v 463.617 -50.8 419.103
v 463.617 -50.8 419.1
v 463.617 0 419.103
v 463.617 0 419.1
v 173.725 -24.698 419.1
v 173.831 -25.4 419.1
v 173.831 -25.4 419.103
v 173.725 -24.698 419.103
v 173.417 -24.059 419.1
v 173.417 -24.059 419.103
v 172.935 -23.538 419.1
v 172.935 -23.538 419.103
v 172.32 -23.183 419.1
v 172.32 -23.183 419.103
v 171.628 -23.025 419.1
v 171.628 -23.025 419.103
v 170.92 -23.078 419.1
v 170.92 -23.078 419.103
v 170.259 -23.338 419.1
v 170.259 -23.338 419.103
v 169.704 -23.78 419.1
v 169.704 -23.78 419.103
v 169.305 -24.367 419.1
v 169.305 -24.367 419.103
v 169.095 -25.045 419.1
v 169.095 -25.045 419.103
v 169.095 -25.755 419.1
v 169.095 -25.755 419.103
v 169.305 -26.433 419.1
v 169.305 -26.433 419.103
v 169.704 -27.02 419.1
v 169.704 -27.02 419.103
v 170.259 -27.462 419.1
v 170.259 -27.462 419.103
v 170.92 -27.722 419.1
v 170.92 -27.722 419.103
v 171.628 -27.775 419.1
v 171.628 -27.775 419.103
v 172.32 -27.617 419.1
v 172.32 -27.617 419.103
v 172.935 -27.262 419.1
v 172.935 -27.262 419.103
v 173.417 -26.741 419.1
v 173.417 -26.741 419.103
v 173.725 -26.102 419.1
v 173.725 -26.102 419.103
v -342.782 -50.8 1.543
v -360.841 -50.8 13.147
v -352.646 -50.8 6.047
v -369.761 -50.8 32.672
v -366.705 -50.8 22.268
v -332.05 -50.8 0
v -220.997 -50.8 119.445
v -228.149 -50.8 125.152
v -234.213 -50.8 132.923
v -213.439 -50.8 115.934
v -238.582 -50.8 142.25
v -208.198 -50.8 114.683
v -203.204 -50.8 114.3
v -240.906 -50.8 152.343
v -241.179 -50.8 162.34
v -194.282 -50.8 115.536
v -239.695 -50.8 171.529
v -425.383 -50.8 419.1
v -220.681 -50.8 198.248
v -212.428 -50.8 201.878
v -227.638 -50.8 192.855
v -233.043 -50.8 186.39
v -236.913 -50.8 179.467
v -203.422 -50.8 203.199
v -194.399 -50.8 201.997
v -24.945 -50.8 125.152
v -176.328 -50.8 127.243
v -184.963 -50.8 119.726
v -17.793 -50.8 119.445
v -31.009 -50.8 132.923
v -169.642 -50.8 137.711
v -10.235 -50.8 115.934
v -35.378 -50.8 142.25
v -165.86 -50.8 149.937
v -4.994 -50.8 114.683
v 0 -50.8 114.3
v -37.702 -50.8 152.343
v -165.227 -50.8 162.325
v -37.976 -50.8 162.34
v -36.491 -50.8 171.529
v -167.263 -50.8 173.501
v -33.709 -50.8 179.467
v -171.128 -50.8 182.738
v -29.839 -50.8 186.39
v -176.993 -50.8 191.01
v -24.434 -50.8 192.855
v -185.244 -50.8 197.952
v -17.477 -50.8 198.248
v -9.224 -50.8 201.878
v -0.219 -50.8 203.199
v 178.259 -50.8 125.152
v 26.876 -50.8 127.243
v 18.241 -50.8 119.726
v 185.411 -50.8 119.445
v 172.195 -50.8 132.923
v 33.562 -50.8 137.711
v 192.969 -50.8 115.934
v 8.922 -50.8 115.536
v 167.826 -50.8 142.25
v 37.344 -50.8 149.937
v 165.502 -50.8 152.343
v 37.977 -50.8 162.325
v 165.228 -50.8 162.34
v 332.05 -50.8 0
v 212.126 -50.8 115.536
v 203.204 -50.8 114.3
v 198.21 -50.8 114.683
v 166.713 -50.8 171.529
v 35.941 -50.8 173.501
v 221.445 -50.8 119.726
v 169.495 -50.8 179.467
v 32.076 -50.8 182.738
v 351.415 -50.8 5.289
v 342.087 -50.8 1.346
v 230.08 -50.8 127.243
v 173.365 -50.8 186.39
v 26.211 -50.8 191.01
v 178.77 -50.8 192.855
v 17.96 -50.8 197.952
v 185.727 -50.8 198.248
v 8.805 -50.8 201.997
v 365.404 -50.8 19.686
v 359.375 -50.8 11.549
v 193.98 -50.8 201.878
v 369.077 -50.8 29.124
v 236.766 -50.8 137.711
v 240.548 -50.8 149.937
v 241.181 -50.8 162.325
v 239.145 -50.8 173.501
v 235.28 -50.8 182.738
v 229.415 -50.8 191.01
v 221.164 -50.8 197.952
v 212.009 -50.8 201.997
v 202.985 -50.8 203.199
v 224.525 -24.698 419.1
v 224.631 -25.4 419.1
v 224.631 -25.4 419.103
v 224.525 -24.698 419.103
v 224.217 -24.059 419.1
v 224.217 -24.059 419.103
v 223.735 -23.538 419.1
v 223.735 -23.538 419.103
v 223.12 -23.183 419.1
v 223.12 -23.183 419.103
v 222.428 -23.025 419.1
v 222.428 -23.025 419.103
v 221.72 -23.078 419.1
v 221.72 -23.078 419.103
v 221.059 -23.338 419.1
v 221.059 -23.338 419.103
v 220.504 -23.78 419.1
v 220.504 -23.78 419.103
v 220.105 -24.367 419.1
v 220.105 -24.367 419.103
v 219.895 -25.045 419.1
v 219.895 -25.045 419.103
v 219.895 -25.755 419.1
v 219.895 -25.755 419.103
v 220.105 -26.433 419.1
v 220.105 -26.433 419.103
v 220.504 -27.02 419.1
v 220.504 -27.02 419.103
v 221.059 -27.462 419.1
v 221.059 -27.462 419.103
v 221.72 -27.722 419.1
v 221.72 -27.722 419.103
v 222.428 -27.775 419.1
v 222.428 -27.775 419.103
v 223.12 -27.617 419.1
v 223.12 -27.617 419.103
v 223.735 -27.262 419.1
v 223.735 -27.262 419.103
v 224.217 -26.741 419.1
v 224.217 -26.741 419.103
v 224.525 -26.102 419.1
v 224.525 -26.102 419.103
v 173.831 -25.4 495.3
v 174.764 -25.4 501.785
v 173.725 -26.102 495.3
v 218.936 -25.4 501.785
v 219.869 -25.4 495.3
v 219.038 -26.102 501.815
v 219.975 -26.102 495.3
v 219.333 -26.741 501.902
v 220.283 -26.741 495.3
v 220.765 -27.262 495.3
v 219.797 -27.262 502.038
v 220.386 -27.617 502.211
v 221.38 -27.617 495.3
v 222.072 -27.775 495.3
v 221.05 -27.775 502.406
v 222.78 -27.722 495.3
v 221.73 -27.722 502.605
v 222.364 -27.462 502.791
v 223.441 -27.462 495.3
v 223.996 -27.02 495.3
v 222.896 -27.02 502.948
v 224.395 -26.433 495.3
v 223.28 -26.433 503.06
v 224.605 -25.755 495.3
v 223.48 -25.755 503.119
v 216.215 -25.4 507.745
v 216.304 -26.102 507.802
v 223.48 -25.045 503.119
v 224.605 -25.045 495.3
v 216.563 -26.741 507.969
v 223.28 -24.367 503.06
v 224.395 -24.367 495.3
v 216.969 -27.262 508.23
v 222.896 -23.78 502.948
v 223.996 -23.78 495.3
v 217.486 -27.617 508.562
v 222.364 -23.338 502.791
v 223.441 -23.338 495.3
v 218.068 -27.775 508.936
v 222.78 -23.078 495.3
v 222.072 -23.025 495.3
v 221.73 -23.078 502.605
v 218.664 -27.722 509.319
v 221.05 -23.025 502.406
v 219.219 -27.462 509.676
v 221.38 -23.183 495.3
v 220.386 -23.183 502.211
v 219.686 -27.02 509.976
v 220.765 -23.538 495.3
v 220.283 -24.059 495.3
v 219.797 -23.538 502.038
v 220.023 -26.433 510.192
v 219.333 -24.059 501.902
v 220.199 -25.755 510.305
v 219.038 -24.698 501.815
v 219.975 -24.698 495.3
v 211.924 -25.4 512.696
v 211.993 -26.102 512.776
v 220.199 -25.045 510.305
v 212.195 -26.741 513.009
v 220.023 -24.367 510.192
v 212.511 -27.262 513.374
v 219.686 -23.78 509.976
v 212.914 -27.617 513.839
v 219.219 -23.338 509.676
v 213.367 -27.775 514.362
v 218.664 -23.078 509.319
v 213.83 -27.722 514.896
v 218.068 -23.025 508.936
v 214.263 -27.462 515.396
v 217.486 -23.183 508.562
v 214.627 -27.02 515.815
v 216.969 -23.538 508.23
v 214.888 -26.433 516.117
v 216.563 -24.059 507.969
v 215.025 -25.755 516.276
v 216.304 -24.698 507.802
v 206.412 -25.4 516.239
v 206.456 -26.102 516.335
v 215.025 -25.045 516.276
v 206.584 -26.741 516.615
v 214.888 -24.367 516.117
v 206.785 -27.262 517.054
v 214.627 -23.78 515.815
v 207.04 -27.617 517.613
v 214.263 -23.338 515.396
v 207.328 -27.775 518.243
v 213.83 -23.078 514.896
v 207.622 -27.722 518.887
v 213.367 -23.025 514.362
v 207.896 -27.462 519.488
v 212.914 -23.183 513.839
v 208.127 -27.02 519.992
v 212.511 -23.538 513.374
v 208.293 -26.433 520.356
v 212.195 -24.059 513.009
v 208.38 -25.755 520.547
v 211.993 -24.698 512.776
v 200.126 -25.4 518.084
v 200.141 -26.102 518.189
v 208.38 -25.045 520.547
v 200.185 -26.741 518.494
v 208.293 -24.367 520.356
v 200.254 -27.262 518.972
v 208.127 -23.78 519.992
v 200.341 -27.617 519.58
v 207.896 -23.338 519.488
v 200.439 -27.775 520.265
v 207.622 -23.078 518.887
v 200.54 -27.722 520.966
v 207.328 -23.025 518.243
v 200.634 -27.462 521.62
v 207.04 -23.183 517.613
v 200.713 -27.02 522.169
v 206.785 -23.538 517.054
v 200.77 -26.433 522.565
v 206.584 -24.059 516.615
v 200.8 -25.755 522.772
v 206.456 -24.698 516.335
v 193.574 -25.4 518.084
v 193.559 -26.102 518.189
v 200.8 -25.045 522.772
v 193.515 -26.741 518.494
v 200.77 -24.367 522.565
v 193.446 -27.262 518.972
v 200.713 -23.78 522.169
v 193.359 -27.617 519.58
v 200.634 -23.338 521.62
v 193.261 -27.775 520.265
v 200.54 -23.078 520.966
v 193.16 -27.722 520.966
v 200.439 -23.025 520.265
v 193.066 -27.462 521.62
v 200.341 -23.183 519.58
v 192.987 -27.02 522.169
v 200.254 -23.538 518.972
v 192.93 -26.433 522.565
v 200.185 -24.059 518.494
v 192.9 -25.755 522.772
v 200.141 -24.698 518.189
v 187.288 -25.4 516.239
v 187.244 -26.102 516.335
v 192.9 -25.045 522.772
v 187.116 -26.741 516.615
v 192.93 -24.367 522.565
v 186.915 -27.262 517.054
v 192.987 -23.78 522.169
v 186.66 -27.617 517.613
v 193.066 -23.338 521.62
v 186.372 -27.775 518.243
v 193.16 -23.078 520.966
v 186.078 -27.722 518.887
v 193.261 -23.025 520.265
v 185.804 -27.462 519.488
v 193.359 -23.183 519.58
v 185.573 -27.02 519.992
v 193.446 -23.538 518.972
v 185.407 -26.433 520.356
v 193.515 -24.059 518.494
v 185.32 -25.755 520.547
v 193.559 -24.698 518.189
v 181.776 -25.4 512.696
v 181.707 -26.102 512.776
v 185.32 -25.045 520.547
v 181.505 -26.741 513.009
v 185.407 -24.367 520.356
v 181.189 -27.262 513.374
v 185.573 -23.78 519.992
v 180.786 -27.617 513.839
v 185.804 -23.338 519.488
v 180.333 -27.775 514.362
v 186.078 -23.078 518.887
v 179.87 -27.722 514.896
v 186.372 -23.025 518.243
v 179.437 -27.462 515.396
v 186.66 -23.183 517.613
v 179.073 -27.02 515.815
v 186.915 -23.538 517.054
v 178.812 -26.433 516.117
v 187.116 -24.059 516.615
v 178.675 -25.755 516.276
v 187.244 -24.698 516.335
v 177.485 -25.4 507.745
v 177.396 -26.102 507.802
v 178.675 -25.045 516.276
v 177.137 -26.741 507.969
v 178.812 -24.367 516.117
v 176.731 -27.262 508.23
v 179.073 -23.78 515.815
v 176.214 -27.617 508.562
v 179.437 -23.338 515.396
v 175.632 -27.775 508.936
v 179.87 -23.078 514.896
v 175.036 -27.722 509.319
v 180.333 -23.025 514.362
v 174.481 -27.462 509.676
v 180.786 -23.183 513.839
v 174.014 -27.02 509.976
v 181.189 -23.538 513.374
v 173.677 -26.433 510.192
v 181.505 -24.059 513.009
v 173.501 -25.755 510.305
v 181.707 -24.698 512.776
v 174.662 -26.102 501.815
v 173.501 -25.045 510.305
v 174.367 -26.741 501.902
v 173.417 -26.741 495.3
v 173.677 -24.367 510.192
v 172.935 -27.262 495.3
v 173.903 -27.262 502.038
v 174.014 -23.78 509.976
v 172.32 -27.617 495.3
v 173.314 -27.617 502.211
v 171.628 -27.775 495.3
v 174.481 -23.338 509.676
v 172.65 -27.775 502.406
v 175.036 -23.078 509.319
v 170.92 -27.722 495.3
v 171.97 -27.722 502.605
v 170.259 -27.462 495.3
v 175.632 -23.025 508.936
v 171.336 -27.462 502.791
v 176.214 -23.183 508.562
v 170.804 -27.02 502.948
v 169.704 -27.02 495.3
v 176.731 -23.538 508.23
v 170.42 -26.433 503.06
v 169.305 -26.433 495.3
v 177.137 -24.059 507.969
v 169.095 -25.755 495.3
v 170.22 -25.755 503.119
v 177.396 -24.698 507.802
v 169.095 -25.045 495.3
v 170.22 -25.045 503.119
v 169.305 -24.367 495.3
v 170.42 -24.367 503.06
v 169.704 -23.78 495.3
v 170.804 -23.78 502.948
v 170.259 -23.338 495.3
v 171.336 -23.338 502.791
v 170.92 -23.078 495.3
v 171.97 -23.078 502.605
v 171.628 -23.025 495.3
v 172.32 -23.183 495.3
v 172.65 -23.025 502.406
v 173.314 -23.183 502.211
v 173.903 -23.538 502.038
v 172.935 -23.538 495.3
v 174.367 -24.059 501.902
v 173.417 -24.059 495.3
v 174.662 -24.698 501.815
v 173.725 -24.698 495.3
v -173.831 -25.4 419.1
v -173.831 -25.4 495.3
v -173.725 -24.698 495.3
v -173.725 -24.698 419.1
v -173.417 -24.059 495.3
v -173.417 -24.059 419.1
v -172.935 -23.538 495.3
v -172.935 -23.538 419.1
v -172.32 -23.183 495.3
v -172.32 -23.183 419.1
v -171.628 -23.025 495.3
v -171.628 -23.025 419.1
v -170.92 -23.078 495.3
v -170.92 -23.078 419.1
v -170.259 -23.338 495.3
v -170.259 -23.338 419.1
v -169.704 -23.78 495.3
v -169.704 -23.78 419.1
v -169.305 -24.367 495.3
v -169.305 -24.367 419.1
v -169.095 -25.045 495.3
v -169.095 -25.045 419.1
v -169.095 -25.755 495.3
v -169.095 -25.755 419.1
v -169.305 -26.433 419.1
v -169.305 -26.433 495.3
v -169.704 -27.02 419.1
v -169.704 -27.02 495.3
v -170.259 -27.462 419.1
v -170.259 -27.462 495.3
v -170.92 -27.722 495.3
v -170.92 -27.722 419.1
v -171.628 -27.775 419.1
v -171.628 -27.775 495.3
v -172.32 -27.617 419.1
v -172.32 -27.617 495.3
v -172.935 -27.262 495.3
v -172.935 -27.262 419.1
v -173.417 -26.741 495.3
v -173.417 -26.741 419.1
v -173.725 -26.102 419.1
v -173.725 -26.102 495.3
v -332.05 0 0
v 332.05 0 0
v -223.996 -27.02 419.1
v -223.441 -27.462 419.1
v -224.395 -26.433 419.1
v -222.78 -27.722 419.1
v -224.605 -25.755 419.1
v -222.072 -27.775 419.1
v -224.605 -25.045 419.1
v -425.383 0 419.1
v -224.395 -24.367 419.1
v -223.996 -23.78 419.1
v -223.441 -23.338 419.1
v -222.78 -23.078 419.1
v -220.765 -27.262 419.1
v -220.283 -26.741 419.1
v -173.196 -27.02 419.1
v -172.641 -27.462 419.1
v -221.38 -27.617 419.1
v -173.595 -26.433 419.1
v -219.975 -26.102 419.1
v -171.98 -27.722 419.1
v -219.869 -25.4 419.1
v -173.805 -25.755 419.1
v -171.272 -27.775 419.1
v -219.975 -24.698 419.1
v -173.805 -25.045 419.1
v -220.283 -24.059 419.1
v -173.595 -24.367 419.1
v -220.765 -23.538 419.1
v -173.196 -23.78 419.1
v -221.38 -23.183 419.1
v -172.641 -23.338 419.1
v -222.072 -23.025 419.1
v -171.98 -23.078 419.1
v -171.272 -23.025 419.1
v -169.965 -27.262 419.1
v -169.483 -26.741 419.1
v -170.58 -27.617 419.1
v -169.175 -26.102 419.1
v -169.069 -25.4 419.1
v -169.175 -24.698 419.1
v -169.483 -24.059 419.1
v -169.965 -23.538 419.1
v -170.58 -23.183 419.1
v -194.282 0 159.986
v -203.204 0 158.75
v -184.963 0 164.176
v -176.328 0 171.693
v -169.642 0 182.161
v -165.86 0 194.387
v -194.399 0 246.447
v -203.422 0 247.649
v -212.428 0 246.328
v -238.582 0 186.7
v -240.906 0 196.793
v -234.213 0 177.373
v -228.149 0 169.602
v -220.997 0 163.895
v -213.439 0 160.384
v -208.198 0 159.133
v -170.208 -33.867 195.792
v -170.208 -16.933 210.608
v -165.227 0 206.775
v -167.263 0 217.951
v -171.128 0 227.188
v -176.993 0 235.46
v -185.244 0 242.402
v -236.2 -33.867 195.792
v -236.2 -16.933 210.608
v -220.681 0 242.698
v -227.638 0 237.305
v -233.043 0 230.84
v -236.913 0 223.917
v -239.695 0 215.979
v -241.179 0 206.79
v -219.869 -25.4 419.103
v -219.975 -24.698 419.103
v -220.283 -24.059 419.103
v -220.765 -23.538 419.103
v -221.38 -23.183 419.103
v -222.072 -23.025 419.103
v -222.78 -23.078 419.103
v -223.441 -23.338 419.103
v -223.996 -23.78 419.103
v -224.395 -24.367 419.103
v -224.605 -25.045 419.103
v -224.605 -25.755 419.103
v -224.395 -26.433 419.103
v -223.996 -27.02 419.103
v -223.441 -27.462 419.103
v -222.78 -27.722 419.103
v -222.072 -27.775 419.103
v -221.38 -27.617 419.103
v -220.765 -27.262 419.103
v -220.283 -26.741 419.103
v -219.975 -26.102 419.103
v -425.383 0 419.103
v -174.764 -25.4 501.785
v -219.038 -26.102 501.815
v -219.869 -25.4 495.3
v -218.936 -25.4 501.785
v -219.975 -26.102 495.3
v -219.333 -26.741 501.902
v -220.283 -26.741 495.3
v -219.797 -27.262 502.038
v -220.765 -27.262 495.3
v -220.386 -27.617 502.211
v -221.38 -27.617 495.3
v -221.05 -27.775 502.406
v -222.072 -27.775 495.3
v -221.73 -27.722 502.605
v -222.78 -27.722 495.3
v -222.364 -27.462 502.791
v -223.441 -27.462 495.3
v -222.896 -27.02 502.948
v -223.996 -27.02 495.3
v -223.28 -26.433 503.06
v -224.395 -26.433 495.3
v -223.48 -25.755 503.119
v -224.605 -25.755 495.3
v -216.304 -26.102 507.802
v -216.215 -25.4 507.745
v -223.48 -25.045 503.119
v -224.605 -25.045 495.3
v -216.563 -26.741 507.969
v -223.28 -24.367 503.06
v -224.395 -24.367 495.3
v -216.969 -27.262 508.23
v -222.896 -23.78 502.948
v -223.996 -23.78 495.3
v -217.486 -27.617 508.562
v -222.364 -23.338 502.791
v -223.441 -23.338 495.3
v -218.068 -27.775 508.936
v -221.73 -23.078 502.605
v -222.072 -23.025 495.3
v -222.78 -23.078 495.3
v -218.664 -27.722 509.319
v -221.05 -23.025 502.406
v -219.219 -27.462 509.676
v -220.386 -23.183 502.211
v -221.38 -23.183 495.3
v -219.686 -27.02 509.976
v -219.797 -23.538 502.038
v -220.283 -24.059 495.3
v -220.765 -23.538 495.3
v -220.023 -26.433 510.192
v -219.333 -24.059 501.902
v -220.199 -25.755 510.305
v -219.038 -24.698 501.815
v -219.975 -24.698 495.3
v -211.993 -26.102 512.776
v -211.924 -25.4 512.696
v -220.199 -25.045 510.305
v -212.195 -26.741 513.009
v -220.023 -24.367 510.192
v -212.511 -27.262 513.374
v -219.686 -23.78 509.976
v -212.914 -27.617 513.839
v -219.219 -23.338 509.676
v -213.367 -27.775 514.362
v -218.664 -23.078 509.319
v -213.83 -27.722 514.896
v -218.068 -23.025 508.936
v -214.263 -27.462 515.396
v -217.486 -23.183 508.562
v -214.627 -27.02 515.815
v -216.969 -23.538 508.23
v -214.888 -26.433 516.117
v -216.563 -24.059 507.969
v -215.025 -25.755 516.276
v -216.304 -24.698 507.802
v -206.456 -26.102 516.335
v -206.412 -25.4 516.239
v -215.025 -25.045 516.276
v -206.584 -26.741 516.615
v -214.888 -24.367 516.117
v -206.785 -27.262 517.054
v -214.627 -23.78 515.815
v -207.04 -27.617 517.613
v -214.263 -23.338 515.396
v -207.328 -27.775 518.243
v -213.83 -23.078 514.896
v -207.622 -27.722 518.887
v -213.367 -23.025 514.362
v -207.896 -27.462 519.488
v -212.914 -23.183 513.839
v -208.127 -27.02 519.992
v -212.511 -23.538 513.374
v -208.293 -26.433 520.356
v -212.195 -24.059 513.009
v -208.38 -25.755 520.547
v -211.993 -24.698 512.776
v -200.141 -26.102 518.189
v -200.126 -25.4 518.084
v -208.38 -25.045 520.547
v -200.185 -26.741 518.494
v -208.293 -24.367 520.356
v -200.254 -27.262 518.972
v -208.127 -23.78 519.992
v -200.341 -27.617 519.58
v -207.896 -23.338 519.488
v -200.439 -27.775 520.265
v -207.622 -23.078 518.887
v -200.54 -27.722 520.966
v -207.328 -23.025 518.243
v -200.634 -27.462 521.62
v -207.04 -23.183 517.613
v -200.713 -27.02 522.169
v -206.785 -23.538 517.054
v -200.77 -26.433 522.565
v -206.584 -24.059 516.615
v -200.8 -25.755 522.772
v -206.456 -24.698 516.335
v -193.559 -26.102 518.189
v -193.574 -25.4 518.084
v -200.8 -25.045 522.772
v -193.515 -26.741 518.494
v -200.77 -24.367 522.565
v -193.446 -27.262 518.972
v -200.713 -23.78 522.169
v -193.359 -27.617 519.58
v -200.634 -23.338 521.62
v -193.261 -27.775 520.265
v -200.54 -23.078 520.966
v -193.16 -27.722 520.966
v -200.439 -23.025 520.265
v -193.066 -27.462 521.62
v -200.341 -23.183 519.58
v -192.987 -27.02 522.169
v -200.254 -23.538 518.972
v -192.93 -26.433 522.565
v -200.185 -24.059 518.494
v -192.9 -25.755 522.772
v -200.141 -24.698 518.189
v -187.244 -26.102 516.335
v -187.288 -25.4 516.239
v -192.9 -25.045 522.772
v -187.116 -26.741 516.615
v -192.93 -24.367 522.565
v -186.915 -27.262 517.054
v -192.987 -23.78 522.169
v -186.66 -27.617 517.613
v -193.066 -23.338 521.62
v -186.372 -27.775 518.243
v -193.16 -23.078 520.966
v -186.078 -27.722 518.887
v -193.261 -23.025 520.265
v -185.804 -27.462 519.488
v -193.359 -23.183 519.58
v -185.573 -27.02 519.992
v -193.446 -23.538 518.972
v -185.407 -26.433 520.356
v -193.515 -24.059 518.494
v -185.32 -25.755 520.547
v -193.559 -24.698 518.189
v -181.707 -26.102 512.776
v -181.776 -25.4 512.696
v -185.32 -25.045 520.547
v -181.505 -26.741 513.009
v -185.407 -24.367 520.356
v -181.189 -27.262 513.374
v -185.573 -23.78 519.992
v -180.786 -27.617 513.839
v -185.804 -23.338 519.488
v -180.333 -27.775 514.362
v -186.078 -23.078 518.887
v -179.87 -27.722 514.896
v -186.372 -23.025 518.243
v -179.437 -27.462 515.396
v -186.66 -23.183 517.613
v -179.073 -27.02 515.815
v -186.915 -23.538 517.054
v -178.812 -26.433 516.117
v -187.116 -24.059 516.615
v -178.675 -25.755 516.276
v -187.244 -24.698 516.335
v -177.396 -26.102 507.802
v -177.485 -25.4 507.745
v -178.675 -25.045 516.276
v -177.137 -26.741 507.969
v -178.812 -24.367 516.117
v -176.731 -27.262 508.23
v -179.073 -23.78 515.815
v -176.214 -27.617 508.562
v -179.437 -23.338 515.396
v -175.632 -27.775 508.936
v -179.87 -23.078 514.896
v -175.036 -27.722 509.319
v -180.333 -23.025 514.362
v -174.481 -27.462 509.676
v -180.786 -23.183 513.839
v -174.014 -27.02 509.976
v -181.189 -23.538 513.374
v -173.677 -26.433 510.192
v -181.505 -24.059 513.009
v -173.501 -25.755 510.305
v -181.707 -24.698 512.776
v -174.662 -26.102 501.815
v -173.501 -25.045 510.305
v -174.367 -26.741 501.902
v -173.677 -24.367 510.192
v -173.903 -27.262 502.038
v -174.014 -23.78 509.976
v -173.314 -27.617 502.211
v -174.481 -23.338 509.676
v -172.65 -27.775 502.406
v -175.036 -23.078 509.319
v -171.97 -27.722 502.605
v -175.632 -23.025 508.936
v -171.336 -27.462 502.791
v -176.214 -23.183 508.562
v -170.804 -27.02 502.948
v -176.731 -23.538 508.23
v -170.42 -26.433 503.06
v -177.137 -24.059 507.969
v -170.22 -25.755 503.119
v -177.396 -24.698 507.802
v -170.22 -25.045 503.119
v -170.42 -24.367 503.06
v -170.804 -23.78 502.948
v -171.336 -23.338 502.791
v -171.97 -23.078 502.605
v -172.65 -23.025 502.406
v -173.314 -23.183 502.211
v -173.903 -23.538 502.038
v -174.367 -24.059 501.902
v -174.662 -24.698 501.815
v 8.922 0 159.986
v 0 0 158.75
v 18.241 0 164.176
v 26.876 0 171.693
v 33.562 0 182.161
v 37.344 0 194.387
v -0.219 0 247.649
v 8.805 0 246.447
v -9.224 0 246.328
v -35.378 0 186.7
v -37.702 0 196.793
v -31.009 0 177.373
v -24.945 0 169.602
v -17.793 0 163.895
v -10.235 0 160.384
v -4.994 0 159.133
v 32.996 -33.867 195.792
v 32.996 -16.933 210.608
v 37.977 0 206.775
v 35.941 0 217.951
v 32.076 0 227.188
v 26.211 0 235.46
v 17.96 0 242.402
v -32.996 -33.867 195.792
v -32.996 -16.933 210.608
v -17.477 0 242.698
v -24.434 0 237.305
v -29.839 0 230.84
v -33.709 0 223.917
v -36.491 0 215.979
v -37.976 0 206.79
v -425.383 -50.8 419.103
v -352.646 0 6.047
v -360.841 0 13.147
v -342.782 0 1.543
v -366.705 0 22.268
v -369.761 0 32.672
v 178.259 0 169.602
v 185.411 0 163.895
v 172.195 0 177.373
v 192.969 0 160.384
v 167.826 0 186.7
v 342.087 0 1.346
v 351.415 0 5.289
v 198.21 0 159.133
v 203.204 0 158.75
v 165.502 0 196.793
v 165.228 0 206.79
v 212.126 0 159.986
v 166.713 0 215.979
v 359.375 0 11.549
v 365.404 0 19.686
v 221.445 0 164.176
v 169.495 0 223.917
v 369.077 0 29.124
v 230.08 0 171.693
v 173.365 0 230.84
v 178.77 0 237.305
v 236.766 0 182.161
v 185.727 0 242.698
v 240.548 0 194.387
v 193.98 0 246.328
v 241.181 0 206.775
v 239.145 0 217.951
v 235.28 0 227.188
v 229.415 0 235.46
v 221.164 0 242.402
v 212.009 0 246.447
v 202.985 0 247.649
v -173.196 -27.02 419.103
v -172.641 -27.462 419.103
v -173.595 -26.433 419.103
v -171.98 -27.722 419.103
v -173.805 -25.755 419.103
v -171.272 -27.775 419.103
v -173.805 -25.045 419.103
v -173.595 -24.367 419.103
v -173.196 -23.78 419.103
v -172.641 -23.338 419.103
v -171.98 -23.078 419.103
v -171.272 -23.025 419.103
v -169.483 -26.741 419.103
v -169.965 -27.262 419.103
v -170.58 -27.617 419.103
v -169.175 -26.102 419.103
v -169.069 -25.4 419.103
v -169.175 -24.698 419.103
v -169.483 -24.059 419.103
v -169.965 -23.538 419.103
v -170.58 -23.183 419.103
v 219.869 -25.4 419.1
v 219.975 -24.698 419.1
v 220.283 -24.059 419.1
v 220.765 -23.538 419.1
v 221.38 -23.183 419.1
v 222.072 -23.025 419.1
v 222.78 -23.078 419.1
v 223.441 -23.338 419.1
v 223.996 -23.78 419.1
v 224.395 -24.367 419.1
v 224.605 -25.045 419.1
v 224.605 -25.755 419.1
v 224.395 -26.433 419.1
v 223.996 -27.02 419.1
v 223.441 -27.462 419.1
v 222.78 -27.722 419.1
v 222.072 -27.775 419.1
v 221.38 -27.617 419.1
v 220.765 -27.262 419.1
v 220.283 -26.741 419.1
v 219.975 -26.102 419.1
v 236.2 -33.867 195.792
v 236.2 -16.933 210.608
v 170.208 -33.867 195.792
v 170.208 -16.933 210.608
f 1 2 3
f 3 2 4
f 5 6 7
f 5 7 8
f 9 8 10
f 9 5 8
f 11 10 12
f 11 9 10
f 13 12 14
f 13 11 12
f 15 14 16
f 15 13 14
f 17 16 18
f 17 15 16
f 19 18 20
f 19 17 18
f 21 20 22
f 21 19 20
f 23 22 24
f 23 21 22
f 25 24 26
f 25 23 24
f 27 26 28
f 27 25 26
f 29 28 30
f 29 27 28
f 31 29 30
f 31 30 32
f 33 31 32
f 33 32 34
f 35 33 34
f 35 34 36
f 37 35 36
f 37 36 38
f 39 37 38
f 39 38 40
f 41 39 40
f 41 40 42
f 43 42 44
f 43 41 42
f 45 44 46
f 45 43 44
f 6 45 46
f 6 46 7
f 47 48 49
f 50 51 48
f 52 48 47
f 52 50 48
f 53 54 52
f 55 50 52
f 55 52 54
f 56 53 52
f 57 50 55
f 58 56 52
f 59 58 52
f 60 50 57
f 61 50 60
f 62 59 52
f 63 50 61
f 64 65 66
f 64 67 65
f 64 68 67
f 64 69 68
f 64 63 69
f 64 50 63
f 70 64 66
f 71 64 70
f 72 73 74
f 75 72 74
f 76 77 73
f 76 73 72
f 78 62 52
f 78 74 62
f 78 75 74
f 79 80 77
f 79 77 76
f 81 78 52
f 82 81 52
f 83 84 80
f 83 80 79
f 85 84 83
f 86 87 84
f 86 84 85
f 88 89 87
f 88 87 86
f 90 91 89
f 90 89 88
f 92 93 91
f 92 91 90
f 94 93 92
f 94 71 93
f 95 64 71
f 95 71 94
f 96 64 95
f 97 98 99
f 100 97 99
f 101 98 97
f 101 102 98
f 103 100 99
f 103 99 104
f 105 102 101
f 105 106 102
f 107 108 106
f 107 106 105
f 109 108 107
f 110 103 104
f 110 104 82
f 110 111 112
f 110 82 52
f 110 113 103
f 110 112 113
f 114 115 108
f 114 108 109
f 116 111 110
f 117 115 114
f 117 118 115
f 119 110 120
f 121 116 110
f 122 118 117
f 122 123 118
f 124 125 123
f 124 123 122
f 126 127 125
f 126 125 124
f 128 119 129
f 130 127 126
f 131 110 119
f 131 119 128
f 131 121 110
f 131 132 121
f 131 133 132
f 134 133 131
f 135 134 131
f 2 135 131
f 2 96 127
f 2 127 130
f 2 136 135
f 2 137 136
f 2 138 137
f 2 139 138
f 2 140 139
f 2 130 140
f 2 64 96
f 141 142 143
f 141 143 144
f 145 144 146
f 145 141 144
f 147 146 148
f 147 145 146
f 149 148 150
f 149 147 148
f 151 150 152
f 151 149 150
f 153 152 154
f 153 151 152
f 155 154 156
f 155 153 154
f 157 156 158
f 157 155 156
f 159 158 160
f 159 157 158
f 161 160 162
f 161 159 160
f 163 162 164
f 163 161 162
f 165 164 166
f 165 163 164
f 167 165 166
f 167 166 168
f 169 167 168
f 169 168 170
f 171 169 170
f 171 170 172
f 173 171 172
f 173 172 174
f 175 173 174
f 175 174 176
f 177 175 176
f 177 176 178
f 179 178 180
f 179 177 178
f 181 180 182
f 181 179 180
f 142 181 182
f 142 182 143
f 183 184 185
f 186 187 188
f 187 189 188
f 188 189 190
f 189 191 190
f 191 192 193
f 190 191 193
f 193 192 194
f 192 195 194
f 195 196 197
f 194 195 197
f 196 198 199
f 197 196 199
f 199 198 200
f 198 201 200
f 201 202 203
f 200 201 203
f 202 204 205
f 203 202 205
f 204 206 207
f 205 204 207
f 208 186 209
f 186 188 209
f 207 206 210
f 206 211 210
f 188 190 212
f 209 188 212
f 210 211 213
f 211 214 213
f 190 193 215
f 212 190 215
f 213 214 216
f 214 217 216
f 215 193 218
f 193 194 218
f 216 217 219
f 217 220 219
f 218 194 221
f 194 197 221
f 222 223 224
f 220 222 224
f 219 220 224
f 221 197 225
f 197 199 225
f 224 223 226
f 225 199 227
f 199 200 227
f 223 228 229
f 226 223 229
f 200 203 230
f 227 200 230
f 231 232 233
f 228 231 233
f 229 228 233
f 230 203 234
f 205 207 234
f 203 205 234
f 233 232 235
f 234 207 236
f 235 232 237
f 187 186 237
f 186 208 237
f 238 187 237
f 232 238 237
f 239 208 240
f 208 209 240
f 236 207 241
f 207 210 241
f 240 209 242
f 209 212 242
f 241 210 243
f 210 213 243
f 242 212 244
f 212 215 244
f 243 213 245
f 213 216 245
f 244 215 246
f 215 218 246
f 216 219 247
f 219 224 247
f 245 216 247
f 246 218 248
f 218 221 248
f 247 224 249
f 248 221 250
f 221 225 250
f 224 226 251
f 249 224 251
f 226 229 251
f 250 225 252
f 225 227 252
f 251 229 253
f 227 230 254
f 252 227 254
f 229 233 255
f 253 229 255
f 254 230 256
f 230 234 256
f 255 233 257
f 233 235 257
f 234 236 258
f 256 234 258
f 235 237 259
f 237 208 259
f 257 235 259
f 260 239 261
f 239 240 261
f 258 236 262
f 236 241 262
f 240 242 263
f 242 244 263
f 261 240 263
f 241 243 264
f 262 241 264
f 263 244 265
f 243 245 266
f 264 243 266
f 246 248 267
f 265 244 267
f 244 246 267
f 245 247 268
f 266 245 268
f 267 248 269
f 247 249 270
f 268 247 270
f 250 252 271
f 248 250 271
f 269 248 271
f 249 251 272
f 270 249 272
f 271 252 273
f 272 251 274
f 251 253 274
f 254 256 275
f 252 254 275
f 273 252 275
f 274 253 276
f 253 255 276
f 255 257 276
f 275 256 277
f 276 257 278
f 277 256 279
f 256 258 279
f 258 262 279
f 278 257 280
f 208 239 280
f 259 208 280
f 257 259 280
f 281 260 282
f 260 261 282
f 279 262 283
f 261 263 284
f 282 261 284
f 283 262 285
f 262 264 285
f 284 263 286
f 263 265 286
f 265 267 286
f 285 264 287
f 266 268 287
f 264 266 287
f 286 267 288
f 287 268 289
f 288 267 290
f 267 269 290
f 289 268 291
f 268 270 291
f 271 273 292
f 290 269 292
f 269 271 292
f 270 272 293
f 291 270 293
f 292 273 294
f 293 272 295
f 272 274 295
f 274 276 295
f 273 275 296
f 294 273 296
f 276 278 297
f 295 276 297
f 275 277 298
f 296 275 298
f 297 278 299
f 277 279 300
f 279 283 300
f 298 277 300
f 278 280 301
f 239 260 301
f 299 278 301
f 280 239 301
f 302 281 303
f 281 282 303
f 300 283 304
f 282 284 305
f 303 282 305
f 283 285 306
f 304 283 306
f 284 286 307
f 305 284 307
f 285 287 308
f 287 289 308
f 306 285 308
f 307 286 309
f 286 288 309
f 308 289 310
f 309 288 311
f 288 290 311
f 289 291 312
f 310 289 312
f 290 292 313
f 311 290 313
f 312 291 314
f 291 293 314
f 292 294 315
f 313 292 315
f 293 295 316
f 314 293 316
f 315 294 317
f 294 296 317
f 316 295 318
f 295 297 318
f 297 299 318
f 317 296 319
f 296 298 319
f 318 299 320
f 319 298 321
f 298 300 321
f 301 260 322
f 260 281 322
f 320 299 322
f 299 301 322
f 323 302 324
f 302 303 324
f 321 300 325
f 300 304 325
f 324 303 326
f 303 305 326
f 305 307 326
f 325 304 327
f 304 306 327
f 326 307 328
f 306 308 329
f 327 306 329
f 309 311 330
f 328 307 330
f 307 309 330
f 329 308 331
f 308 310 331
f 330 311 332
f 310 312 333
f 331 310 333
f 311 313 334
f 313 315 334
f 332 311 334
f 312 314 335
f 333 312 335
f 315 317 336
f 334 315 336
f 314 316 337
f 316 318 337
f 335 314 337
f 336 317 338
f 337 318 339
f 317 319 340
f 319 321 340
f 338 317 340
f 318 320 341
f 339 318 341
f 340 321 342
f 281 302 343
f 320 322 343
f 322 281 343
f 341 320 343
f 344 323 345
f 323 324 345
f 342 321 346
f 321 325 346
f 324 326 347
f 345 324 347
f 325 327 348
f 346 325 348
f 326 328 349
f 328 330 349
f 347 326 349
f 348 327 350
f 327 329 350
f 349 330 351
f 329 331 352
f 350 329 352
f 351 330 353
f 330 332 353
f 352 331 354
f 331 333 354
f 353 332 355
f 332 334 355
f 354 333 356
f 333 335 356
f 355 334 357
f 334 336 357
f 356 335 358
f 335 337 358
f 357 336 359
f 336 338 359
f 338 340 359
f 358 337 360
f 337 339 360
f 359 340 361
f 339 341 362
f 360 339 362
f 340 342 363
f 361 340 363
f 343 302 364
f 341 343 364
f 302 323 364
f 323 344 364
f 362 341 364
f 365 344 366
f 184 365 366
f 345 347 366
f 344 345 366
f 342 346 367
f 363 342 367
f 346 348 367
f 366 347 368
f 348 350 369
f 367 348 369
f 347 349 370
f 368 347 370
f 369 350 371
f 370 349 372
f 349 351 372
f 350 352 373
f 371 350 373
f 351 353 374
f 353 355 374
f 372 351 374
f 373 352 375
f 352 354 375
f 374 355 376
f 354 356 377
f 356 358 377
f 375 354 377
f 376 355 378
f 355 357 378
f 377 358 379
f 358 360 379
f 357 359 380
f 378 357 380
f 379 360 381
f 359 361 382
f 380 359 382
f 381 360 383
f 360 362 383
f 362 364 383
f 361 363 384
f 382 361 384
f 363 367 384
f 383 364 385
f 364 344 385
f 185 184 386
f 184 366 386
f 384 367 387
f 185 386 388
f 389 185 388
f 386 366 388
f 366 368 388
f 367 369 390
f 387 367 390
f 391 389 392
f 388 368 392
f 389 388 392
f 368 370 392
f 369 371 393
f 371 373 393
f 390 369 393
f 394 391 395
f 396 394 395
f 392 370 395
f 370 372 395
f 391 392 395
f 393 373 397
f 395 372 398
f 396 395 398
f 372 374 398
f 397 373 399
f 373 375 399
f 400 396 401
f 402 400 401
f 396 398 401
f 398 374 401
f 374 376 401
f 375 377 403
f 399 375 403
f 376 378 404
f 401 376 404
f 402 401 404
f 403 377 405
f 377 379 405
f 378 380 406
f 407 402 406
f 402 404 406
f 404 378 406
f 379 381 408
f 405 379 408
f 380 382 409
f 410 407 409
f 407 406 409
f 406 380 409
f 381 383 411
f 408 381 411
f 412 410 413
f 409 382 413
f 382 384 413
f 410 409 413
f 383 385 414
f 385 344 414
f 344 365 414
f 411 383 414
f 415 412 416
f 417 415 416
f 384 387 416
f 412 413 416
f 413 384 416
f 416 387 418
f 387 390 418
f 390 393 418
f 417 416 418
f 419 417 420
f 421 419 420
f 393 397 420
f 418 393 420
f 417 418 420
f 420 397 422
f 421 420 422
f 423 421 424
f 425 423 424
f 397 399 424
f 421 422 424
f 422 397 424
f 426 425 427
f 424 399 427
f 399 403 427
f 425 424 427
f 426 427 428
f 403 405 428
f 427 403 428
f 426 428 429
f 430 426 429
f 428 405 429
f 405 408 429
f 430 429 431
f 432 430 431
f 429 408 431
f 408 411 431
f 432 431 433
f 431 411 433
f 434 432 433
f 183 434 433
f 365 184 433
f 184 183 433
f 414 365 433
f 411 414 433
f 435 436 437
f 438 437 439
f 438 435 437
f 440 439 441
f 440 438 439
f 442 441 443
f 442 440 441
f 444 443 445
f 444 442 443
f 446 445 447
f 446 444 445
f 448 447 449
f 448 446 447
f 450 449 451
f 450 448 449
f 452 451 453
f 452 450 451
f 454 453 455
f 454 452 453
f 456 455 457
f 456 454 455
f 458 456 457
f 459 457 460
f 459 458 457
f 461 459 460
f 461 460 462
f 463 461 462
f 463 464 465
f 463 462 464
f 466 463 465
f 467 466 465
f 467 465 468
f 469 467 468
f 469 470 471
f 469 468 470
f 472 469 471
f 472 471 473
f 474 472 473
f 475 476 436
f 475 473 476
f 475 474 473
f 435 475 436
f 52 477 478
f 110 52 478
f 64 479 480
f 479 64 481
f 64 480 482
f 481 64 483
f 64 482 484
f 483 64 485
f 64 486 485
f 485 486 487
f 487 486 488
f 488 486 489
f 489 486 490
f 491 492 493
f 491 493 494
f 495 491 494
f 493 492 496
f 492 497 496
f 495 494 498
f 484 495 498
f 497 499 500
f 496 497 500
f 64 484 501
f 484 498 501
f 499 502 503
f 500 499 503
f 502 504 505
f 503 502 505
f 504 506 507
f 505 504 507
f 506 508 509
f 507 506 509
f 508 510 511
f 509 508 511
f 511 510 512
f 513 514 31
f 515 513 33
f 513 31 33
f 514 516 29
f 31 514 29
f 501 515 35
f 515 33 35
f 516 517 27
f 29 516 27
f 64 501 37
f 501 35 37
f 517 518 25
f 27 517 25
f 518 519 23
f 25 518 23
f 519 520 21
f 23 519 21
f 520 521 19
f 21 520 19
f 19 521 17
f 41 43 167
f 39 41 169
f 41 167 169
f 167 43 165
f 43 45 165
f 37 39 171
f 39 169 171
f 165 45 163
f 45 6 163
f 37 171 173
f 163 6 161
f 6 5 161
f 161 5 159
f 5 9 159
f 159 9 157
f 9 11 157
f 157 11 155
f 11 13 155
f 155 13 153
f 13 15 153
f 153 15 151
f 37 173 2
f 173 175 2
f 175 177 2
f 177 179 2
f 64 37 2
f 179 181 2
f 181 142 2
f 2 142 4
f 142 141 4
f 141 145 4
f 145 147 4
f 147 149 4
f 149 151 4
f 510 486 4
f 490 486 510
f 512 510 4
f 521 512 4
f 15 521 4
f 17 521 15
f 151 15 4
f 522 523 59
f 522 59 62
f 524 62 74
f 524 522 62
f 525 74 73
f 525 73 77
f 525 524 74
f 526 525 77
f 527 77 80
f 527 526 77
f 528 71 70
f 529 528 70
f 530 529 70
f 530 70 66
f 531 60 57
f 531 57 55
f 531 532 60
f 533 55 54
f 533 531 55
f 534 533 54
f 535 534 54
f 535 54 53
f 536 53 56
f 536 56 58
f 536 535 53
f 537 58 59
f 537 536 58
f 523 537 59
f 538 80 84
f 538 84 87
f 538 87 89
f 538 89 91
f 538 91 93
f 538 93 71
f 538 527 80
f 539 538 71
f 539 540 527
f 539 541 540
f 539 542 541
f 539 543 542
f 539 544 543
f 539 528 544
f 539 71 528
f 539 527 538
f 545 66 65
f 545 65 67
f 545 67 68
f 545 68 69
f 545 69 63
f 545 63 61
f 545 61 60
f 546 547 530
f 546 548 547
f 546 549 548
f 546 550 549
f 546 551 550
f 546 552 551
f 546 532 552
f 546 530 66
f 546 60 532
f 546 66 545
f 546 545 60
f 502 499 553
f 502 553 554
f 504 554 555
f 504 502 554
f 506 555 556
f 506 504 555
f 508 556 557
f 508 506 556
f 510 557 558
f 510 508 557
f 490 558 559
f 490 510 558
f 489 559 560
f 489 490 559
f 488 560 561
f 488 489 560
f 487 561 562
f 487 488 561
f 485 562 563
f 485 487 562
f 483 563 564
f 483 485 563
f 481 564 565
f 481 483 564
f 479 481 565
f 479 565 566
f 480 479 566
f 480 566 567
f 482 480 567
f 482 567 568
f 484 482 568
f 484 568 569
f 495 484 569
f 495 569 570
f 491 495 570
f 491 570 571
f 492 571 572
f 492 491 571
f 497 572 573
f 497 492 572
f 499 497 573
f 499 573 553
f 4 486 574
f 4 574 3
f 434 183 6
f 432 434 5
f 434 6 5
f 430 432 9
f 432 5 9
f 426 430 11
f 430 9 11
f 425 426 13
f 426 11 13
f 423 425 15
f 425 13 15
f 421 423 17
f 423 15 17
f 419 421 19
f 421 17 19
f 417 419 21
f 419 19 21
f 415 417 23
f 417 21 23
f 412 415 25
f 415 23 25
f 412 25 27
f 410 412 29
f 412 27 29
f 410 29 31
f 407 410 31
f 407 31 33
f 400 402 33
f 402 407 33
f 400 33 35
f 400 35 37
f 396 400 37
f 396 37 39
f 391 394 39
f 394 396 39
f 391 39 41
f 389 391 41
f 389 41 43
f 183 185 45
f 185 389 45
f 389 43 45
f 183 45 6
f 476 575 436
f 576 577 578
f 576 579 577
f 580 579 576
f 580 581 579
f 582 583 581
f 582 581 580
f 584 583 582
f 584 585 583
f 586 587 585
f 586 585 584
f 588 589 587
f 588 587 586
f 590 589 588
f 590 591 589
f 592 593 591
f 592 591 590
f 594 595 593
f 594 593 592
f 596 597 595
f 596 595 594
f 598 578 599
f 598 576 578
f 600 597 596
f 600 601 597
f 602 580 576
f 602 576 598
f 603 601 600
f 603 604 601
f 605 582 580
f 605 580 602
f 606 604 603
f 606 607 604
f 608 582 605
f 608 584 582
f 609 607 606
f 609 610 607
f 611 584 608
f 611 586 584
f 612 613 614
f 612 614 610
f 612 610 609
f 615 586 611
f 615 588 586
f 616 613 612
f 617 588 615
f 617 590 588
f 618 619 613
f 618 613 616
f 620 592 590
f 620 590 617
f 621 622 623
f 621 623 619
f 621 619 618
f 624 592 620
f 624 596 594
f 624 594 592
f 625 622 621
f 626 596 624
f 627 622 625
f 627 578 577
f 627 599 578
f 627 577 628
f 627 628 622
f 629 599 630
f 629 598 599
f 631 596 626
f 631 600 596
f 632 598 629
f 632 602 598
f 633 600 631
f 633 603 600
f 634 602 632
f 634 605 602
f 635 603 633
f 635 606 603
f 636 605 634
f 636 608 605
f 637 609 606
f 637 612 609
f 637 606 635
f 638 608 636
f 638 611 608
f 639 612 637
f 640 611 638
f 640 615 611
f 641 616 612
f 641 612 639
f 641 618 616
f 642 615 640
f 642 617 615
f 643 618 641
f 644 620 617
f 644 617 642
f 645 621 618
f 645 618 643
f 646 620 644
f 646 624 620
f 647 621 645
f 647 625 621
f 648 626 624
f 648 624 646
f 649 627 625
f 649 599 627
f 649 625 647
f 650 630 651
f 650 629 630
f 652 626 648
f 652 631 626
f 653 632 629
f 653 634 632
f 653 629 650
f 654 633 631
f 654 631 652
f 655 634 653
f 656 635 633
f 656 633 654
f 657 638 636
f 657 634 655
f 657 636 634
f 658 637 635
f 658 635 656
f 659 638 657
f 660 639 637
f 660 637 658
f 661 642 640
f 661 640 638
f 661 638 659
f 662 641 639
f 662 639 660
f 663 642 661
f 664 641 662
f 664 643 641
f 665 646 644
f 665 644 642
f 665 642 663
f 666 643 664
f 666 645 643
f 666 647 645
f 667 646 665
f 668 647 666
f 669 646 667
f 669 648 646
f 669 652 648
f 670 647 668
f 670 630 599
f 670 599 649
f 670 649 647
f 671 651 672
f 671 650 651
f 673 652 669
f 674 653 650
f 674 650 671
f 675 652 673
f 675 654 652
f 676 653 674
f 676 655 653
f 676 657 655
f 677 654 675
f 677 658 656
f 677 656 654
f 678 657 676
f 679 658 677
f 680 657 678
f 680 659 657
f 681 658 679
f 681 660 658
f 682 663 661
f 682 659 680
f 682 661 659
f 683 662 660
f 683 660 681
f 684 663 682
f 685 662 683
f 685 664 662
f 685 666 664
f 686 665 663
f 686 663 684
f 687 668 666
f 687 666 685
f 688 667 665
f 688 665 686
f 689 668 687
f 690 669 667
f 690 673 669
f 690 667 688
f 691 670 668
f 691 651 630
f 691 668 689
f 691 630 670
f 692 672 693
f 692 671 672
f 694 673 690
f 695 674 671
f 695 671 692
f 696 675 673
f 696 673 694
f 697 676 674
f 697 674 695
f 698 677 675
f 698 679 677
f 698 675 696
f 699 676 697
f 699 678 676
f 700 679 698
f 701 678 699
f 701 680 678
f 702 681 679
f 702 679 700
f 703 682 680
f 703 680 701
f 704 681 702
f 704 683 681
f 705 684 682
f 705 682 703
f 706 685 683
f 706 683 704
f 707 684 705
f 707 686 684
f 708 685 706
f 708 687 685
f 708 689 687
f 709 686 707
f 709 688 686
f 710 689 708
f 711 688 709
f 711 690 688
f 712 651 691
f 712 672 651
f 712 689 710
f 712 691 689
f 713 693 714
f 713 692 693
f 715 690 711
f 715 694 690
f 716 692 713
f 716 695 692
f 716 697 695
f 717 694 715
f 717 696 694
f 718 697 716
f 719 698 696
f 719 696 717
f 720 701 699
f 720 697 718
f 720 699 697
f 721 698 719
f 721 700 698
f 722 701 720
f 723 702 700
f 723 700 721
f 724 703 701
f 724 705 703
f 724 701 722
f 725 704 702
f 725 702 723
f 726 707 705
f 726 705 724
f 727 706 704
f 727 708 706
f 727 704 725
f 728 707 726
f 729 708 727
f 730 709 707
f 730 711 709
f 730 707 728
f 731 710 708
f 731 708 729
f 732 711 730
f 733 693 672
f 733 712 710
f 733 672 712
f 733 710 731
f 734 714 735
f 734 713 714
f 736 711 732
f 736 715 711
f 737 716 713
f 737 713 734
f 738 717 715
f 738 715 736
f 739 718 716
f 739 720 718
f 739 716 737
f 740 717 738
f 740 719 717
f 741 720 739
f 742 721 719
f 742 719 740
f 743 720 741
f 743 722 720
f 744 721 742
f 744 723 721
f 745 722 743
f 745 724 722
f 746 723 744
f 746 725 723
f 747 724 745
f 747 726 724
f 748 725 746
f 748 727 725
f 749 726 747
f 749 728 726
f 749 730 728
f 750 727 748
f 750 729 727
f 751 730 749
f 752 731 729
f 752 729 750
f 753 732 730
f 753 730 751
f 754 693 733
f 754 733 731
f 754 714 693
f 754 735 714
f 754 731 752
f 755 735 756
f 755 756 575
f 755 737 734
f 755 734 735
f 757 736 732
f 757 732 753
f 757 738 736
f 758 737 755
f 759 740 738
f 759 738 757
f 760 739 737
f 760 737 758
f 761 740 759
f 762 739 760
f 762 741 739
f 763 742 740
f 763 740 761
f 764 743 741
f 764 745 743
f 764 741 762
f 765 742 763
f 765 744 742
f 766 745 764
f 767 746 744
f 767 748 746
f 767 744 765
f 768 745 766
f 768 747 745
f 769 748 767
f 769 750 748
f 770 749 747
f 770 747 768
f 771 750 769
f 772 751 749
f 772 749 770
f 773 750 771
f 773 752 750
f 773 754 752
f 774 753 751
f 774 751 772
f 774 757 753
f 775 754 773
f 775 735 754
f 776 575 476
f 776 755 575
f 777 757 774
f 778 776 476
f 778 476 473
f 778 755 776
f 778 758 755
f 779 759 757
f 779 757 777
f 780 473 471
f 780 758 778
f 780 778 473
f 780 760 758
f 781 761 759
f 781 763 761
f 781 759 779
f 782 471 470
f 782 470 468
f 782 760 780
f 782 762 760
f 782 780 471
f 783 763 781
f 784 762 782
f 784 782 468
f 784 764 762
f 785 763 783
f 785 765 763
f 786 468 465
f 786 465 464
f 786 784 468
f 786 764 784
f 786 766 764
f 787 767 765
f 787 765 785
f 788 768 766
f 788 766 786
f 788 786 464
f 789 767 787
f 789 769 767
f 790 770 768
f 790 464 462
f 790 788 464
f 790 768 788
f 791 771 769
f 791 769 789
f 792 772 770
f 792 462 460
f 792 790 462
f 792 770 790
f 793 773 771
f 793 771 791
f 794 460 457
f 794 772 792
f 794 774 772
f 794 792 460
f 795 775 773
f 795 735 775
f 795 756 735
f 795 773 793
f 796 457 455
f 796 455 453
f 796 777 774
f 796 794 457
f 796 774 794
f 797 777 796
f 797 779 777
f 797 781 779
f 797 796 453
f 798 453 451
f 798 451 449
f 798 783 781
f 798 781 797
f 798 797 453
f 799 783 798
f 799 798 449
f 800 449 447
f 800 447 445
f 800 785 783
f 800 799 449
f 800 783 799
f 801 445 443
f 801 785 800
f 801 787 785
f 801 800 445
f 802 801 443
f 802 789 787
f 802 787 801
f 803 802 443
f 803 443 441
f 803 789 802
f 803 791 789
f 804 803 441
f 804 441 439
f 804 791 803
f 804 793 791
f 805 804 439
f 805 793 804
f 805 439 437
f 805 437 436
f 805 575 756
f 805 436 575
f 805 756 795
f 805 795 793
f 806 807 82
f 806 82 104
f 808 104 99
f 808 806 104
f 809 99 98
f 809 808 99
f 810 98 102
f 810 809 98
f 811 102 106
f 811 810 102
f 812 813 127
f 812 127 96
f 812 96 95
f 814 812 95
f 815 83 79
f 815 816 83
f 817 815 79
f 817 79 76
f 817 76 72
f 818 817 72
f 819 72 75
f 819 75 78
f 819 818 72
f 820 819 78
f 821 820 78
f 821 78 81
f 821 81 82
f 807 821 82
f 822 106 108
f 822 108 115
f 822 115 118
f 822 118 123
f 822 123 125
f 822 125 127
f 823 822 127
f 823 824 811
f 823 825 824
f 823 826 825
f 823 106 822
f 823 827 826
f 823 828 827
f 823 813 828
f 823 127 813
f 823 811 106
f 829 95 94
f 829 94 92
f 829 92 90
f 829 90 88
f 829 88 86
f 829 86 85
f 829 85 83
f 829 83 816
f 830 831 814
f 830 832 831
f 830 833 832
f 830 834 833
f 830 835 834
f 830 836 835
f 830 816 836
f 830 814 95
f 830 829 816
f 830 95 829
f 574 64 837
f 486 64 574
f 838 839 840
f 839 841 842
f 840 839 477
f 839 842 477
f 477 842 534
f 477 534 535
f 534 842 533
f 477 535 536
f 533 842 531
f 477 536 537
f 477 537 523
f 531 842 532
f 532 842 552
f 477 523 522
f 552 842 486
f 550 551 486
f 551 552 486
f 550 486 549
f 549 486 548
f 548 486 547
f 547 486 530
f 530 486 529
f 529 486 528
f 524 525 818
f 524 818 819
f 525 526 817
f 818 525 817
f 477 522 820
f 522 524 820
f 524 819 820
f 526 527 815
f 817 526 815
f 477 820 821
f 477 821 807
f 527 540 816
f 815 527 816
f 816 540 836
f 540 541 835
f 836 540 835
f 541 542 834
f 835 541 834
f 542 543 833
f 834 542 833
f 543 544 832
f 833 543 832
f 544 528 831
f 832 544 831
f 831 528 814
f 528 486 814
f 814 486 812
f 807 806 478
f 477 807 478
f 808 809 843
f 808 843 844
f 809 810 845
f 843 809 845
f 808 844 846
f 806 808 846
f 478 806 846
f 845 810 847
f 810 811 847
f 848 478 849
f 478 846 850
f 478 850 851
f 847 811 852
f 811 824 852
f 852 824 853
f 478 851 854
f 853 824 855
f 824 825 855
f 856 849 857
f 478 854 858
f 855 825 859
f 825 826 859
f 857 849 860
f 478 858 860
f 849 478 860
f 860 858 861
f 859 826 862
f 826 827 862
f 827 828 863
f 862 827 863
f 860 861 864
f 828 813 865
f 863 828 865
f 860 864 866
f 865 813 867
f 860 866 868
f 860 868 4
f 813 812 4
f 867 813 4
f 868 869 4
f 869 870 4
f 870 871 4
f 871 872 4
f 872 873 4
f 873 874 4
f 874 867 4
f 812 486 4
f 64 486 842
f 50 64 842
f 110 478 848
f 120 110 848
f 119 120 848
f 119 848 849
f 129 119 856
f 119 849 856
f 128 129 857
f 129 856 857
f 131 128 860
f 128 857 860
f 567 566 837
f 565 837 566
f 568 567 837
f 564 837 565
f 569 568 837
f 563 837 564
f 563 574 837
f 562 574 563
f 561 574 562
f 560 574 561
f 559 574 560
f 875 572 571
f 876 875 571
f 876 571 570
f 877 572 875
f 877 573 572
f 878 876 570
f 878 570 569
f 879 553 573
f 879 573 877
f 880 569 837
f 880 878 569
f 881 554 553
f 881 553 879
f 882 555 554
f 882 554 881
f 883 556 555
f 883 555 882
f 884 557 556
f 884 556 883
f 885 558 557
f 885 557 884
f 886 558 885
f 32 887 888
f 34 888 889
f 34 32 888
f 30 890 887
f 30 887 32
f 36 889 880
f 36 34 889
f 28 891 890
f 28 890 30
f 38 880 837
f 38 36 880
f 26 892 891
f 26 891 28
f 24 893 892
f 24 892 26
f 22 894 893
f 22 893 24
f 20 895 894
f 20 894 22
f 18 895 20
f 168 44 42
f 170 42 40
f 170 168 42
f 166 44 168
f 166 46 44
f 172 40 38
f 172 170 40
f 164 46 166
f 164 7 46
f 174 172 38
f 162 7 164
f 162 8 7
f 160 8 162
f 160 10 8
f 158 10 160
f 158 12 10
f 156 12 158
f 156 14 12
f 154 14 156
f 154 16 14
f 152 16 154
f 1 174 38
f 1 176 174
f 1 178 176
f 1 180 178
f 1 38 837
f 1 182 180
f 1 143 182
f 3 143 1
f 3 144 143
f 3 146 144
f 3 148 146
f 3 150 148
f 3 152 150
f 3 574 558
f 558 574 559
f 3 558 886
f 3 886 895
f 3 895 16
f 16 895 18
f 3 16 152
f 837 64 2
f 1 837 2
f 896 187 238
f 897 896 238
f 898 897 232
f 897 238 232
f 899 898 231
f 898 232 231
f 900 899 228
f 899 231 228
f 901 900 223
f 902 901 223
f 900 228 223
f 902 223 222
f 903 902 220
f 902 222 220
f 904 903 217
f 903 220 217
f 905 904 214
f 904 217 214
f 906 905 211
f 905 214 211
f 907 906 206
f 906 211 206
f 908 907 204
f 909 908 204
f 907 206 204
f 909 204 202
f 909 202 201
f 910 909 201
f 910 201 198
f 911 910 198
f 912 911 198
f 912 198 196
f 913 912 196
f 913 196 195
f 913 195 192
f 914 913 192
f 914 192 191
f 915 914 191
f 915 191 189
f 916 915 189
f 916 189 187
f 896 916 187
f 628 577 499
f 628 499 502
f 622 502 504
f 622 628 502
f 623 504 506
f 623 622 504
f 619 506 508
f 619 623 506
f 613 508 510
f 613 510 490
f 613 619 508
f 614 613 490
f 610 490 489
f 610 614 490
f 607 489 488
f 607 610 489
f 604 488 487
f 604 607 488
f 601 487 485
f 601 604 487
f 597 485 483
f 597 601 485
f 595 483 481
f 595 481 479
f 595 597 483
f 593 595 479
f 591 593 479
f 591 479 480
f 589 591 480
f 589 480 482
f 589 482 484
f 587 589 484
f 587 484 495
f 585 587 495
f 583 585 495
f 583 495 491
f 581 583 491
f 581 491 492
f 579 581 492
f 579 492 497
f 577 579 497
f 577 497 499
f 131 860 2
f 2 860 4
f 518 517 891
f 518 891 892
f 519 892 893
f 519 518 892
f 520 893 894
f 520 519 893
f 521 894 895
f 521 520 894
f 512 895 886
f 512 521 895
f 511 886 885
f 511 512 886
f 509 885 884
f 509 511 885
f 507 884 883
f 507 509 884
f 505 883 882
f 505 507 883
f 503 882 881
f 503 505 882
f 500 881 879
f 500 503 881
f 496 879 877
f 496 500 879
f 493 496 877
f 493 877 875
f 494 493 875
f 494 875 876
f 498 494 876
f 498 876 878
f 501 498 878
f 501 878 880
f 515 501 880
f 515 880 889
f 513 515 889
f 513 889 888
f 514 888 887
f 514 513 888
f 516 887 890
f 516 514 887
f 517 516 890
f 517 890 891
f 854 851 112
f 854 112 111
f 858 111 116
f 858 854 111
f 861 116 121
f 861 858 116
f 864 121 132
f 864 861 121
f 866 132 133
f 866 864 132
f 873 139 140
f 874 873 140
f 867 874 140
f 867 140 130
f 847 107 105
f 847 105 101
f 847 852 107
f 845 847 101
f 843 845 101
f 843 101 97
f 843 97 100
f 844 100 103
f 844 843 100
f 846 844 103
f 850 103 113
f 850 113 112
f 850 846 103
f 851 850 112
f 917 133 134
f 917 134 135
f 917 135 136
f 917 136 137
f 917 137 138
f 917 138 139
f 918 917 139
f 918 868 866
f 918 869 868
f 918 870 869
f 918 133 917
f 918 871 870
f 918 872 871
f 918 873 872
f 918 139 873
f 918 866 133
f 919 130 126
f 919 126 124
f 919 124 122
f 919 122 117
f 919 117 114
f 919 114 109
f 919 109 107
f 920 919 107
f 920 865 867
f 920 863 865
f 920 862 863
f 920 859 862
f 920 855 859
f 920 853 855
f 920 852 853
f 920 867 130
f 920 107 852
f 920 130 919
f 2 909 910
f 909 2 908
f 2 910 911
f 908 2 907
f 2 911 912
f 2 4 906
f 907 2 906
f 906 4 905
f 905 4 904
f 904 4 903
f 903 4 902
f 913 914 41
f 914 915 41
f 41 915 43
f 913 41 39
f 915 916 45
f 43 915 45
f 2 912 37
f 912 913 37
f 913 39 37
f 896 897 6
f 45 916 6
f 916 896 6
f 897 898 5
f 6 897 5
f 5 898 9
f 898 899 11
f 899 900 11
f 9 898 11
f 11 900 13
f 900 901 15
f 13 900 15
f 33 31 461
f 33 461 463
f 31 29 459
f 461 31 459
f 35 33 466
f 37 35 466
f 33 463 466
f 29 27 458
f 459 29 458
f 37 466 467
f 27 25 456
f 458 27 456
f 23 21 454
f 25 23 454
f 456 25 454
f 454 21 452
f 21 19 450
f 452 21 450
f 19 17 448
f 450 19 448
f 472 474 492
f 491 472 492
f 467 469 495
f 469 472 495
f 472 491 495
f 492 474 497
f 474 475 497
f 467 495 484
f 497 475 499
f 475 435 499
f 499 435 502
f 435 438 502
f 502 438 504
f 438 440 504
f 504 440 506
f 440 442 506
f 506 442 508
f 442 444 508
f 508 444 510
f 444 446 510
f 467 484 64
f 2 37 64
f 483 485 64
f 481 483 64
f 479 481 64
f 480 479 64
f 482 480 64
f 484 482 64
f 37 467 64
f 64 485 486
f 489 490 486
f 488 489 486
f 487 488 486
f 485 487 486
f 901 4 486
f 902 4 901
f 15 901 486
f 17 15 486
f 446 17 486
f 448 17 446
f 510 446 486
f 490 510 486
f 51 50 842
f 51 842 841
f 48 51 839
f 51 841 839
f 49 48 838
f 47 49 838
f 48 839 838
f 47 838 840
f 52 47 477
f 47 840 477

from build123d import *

# Parameters (mm, degrees)
F1_DEPTH = 50.8
F5_R     = 2.38125
F8_W     = 889
F8_H     = 50.8
F8_R     = 2.38125
F9_DEPTH = 0.00254


# Not quite as in the source:
# - a pattern or mirror of a feature is missing from the dataset's text; its kind, count and spacing are read off the source's solid


with BuildPart() as f1:
    # F0 (on Front) → F1 (new body)
    with BuildSketch(Plane.XZ):
        with BuildLine():
            Line((-425.3831805585, 419.1), (-369.7609472035, 32.6718524805))
            ThreePointArc((-369.7609472035, 32.6718524805), (-356.9975280935, 9.3039723183), (-332.0496065417, 0))
            Line((-332.0496065417, 0), (332.0496065417, 0))
            ThreePointArc((332.0496065417, 0), (355.6039123775, 8.1533027431), (369.0770955684, 29.1236390238))
            Line((369.0770955684, 29.1236390238), (463.6168194415, 419.1))
            Line((463.6168194415, 419.1), (-425.3831805585, 419.1))
        make_face()
    extrude(amount=F1_DEPTH)

    # F4: sweep along a path in F3
    with BuildLine(Plane.YZ) as f4_path:
        Line((-50.8, 158.75), (0, 203.2))
    # F2 (on face) → F4 (sweep, cut)
    with BuildSketch(Plane.XZ.offset(50.8)):
        with BuildLine():
            add(Edge.make_bspline(
                [(-203.2039687112, 114.3), (-137.2128329429, 114.3), (-170.2084008271, 180.975), (-203.2039687112, 247.65), (-236.1995365954, 180.975), (-269.1951044796, 114.3), (-203.2039687112, 114.3)],
                knots=[0, 0, 0, 2.0943951024, 2.0943951024, 4.1887902048, 4.1887902048, 6.2831853072, 6.2831853072, 6.2831853072], degree=2, weights=[1, 0.5, 1, 0.5, 1, 0.5, 1]))
        make_face()
        with BuildLine():
            add(Edge.make_bspline(
                [(0, 114.3), (65.9911357684, 114.3), (32.9955678842, 180.975), (0, 247.65), (-32.9955678842, 180.975), (-65.9911357684, 114.3), (0, 114.3)],
                knots=[0, 0, 0, 2.0943951024, 2.0943951024, 4.1887902048, 4.1887902048, 6.2831853072, 6.2831853072, 6.2831853072], degree=2, weights=[1, 0.5, 1, 0.5, 1, 0.5, 1]))
        make_face()
        with BuildLine():
            add(Edge.make_bspline(
                [(203.2039687112, 114.3), (269.1951044796, 114.3), (236.1995365954, 180.975), (203.2039687112, 247.65), (170.2084008271, 180.975), (137.2128329429, 114.3), (203.2039687112, 114.3)],
                knots=[0, 0, 0, 2.0943951024, 2.0943951024, 4.1887902048, 4.1887902048, 6.2831853072, 6.2831853072, 6.2831853072], degree=2, weights=[1, 0.5, 1, 0.5, 1, 0.5, 1]))
        make_face()
    sweep(path=f4_path.line, mode=Mode.SUBTRACT)

    # F7: sweep along a path in F6
    with BuildLine(Plane.XZ) as f7_path:
        Line((-222.25, 419.1), (-222.25, 495.3))
        ThreePointArc((-222.25, 495.3), (-196.85, 520.7), (-171.45, 495.3))
        Line((-171.45, 495.3), (-171.45, 419.1))
    # F5 (on face) → F7 (sweep)
    with BuildSketch(Plane.XY.offset(419.1)):
        with Locations((-222.25, -25.4)):
            Circle(F5_R)
    f7 = sweep(path=f7_path.line)

    # F7_copies: F7 across plane
    add(f7.mirror(Plane(origin=(0, 0, 0), x_dir=(0, 0, 1), z_dir=(1, 0, 0))))


with BuildPart() as f9:
    # F8 (on face) → F9 (new body)
    with BuildSketch(Plane.XY.offset(419.1)):
        with Locations((19.1168194415, -25.4)):
            Rectangle(F8_W, F8_H)
        with Locations((-222.25, -25.4)):
            Circle(F8_R, mode=Mode.SUBTRACT)
        with Locations((-171.45, -25.4)):
            Circle(F8_R, mode=Mode.SUBTRACT)
        with Locations((171.45, -25.4)):
            Circle(F8_R, mode=Mode.SUBTRACT)
        with Locations((222.25, -25.4)):
            Circle(F8_R, mode=Mode.SUBTRACT)
    extrude(amount=F9_DEPTH)


solid = Compound([f1.part, f9.part])
